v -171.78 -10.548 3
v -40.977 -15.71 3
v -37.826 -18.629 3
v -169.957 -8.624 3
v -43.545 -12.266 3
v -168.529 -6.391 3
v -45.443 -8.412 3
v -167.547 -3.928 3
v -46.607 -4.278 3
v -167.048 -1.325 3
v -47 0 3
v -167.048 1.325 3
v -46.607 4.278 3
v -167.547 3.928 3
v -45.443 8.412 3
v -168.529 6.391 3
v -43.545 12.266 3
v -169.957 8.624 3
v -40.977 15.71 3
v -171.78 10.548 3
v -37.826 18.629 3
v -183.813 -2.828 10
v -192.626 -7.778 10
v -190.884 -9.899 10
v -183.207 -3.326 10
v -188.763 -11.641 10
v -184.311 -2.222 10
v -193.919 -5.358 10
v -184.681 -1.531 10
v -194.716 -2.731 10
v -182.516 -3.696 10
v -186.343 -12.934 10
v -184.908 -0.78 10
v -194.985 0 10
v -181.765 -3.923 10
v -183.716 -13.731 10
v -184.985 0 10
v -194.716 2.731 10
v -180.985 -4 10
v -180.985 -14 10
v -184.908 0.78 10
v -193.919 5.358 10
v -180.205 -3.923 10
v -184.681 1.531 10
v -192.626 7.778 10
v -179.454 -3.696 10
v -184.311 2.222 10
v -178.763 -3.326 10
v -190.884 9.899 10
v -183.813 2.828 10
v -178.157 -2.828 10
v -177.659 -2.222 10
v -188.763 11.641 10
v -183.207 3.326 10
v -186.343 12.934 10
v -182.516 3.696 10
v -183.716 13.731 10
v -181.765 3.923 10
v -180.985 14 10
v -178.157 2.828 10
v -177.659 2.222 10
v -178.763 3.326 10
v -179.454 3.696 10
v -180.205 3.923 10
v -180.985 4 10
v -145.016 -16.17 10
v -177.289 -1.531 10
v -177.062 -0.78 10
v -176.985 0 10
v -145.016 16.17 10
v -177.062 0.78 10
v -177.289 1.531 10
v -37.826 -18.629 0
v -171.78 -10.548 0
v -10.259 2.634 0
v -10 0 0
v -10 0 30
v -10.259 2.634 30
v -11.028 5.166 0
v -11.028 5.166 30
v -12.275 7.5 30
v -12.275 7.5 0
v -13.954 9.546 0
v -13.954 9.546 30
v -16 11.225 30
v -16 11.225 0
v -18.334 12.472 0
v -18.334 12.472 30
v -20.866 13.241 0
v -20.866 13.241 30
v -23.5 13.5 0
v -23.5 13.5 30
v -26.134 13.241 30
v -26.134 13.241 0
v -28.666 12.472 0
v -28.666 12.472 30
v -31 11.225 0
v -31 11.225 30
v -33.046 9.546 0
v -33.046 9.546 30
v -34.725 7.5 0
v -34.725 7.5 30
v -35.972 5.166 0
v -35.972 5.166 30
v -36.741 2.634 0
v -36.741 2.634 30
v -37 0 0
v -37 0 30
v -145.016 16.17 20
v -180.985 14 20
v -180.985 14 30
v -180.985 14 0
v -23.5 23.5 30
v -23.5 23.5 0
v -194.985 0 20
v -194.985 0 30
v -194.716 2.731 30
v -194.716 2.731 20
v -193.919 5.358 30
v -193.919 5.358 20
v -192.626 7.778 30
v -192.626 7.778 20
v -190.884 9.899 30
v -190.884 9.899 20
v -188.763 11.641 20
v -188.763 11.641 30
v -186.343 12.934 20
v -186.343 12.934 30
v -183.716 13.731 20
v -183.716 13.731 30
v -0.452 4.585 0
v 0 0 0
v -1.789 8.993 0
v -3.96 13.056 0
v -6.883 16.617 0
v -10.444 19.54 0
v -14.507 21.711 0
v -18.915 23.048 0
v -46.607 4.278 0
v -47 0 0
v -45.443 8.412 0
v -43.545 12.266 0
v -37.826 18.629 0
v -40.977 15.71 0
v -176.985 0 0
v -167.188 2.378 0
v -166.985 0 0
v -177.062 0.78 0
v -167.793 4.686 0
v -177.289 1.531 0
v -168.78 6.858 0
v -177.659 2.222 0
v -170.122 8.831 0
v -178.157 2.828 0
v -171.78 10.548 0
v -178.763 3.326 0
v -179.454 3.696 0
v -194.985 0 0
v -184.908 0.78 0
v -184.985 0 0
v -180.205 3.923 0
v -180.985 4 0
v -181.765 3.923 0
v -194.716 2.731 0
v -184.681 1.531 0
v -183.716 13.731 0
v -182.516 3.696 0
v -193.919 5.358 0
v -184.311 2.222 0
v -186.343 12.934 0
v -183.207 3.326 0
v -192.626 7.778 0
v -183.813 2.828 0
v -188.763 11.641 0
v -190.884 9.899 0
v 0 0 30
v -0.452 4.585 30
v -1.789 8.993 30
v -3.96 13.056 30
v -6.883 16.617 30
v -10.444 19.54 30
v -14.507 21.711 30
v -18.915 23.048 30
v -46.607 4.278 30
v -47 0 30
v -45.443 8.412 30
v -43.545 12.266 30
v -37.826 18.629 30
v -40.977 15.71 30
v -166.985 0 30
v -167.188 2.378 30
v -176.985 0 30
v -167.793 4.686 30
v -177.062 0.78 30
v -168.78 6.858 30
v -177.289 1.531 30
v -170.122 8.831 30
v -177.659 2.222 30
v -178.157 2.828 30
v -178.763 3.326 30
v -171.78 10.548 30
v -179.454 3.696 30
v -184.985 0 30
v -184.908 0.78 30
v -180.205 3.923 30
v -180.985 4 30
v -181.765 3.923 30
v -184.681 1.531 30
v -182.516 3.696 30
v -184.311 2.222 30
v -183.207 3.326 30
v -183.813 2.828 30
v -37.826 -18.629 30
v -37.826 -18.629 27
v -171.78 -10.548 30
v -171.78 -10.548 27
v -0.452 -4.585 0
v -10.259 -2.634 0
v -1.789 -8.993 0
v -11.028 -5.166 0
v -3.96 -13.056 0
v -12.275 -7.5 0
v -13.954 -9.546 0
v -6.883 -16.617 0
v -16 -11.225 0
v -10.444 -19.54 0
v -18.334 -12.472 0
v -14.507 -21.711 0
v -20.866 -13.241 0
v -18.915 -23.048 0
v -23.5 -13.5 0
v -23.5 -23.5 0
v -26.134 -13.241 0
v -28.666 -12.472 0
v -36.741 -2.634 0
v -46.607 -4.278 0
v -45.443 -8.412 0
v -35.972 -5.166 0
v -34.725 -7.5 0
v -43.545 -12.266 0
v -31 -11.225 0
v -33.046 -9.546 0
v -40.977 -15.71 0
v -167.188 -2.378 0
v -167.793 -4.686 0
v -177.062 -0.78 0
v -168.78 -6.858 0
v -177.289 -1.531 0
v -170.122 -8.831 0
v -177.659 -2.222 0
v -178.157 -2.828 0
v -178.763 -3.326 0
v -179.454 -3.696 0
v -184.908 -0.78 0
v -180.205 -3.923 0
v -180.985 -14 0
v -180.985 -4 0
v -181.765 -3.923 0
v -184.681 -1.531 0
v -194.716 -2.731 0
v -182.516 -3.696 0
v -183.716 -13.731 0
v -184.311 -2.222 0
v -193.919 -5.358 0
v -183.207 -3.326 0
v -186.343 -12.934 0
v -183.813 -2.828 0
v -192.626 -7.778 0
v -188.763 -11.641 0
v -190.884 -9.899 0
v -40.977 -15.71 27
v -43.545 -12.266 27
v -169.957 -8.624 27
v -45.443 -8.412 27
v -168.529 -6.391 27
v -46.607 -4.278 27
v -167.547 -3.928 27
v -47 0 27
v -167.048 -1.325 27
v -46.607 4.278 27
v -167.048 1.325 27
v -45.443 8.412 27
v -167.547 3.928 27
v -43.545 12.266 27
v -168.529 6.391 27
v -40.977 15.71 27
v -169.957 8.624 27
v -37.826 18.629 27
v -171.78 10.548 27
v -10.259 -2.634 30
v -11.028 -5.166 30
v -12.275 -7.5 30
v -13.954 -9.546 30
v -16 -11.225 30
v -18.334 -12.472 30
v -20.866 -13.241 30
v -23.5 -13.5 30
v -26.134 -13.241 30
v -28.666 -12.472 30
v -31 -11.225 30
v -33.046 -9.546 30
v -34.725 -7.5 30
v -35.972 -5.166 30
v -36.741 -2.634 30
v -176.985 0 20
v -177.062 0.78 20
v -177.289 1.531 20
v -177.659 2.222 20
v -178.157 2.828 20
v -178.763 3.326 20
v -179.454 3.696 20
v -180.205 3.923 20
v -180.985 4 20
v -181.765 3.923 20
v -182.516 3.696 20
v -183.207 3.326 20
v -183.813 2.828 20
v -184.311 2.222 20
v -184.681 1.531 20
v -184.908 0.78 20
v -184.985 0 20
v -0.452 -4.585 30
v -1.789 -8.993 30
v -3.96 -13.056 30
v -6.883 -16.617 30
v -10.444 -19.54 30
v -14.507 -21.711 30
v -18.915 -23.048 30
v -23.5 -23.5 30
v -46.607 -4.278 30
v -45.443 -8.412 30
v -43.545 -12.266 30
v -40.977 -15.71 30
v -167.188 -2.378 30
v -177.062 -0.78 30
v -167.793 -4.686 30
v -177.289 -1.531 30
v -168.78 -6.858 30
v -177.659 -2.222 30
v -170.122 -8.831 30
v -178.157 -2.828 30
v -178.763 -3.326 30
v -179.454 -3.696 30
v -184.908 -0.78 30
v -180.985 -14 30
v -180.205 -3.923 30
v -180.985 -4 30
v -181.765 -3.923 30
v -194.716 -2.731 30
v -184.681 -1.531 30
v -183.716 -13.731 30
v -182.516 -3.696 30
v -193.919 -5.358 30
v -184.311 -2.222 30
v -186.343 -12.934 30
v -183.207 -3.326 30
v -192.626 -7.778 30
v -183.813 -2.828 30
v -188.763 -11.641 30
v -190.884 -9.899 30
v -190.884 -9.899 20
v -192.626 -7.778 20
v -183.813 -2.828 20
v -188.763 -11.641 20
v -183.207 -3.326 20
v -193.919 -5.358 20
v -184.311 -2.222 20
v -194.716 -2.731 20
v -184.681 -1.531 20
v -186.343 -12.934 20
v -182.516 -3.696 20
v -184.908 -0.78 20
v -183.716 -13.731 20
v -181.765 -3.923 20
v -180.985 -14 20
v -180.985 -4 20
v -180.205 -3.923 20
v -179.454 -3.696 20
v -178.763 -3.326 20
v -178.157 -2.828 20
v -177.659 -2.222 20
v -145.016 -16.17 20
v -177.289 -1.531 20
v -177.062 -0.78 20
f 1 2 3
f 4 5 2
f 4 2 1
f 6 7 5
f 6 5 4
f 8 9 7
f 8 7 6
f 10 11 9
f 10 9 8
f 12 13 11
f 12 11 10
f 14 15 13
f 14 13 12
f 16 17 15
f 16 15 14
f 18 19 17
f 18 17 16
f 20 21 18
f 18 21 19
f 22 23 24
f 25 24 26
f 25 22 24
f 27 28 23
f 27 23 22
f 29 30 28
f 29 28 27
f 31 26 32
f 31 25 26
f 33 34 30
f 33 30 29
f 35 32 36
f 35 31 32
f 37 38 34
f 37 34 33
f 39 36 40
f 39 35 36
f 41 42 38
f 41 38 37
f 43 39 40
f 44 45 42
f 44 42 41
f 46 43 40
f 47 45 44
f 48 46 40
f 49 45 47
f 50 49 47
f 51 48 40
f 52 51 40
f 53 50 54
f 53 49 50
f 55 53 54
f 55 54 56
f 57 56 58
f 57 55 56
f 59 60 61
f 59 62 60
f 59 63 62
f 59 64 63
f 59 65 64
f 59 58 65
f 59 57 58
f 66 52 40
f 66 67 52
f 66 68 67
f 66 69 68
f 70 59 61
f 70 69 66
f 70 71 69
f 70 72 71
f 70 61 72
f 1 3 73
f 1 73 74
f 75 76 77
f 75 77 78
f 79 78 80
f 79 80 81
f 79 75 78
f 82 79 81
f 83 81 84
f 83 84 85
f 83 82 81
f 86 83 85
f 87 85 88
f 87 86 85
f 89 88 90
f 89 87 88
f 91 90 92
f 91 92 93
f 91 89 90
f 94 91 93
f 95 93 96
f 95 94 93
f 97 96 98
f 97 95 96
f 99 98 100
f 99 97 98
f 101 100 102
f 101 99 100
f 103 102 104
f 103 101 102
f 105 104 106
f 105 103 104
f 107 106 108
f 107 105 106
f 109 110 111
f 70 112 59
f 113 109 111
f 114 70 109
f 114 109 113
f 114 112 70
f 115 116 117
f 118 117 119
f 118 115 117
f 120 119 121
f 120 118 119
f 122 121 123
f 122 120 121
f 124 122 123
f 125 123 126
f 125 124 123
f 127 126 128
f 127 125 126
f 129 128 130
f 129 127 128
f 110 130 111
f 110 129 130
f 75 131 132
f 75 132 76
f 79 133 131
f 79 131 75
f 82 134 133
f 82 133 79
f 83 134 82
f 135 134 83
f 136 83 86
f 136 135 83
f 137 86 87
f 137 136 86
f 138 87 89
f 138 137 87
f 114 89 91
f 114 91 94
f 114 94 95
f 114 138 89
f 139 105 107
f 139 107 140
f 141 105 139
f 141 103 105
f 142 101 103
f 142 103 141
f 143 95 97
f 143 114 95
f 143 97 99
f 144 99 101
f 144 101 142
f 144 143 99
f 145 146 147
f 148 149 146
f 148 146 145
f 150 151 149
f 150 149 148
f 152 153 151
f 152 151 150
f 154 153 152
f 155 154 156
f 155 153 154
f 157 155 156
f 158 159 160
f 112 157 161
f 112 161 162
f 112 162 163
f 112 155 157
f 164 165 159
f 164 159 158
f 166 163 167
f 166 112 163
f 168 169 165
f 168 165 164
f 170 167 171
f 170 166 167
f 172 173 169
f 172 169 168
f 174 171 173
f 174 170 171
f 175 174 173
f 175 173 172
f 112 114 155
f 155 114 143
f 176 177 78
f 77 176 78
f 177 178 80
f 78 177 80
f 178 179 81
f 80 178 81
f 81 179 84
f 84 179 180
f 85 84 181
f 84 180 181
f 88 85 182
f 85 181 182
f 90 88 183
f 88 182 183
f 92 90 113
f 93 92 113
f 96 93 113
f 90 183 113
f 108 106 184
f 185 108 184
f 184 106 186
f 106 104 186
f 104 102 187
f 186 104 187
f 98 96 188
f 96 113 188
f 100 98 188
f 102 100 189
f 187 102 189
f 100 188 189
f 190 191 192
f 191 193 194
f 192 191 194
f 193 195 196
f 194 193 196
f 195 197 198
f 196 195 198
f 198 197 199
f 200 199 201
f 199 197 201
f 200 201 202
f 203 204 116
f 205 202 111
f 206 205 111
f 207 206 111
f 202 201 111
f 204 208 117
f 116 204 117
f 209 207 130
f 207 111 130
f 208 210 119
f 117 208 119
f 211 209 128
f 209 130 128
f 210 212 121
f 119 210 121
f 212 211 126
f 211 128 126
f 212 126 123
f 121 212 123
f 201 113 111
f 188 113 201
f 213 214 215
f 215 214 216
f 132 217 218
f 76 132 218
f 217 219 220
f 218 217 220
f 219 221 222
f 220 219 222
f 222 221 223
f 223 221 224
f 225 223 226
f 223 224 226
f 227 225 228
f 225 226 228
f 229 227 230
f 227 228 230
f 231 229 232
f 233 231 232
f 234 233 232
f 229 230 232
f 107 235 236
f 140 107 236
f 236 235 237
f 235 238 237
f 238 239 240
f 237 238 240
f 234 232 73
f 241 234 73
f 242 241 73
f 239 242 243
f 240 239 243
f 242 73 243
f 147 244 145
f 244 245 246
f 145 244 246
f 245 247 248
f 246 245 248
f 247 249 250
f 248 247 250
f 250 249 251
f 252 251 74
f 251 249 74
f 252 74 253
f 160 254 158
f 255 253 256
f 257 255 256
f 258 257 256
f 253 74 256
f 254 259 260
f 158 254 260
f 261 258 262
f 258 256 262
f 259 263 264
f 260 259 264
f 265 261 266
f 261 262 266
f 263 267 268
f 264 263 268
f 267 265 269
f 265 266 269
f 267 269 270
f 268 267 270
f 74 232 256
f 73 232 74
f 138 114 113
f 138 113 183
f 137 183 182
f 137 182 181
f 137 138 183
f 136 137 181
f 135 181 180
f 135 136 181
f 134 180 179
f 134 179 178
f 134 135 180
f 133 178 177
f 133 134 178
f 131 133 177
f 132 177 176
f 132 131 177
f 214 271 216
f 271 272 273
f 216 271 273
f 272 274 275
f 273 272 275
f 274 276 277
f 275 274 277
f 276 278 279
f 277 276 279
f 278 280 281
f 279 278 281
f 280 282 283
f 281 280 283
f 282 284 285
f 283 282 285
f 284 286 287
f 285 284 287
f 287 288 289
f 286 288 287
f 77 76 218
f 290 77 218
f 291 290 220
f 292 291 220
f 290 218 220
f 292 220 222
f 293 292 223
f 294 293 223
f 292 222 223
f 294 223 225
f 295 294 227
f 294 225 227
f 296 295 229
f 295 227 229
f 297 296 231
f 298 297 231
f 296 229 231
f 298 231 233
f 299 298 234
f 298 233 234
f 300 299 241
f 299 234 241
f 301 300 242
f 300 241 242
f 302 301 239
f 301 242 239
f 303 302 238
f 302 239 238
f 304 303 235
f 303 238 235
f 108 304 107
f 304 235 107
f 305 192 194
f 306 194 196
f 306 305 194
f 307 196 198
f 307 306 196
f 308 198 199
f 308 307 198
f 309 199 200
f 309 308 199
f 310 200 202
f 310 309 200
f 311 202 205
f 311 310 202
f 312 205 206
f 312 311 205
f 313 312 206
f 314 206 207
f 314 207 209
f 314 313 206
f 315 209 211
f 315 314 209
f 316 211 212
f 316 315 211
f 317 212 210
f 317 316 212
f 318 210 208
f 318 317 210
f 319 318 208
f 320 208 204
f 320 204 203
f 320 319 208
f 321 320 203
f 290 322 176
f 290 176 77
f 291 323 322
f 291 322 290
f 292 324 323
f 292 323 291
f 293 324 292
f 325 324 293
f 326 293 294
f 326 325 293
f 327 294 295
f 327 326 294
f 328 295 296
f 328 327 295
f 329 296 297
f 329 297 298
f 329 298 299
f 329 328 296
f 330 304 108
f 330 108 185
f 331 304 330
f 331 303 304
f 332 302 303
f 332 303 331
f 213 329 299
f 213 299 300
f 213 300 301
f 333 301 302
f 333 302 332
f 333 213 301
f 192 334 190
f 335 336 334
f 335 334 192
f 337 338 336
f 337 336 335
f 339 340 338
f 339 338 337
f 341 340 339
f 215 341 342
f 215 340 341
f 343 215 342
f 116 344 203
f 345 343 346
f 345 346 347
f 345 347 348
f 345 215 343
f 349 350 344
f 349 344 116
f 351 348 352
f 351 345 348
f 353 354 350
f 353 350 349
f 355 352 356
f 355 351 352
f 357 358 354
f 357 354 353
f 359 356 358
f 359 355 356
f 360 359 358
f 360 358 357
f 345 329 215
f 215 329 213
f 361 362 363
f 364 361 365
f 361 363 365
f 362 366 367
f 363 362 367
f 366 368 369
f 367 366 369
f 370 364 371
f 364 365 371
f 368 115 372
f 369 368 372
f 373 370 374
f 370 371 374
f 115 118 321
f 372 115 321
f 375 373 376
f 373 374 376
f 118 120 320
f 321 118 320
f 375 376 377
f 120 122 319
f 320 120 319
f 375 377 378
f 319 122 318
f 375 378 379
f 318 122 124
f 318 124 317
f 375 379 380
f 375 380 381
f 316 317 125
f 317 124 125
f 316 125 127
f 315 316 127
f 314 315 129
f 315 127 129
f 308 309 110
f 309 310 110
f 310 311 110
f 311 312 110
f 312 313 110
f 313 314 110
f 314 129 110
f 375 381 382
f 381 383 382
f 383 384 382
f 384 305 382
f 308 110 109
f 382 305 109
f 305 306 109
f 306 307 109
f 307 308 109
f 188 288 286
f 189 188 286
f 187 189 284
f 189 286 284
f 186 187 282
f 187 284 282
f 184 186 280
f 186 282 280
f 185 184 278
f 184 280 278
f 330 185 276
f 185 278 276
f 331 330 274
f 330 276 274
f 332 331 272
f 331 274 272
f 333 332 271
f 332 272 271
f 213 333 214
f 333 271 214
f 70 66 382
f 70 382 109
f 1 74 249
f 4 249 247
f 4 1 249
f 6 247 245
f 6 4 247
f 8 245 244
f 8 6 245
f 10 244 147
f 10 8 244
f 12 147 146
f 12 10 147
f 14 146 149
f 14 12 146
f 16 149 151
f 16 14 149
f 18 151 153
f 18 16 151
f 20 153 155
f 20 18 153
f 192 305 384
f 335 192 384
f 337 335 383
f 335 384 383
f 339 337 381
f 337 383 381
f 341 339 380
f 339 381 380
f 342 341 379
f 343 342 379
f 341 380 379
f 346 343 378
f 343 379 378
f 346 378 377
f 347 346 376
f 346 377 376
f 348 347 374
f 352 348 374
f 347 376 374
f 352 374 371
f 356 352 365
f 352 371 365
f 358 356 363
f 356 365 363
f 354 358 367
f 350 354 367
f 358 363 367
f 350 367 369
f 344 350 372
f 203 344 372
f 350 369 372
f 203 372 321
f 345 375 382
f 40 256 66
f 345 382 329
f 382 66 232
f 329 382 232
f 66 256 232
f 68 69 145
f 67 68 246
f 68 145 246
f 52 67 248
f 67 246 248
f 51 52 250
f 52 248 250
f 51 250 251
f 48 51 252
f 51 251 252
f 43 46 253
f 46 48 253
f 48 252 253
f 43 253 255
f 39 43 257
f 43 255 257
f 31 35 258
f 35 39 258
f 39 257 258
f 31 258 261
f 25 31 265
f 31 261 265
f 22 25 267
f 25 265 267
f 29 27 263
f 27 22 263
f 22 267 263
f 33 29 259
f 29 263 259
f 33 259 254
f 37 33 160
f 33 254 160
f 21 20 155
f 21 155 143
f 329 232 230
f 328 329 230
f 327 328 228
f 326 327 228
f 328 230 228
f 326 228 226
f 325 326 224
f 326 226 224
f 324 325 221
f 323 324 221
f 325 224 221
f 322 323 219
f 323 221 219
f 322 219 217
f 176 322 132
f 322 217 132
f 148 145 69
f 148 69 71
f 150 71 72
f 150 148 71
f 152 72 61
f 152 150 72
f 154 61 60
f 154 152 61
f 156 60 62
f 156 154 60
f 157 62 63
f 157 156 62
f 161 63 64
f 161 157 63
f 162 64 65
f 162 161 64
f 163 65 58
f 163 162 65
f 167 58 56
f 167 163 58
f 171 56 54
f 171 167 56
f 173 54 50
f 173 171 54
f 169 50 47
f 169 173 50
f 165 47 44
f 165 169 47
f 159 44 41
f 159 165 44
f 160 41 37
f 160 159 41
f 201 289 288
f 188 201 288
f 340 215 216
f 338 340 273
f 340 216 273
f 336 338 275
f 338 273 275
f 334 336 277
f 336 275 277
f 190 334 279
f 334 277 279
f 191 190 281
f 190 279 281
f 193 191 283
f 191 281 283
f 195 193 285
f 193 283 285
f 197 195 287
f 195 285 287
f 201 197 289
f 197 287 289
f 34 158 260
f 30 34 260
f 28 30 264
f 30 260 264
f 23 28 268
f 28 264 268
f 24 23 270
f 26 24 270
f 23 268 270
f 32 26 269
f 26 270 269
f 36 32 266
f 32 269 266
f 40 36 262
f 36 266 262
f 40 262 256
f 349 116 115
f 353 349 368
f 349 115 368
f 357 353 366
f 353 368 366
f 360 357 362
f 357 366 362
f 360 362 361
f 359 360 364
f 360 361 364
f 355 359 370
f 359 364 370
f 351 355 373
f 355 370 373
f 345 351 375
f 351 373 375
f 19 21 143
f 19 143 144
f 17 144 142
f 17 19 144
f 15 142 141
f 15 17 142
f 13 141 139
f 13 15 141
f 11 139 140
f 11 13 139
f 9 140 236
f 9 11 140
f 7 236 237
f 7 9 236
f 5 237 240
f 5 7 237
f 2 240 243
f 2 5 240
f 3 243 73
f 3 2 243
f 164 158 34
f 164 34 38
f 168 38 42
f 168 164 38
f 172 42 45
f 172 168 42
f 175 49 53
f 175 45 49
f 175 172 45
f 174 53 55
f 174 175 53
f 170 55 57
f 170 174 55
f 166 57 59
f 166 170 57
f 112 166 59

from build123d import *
from build123d.topology import SkipClean

# Parameters (mm, degrees)
BOSS_EXTRUDE1_DEPTH     = 30
CUT_EXTRUDE1_DEPTH      = 5
CUT_EXTRUDE1_DEPTH_BACK = 5
SKETCH2_R               = 4
CUT_EXTRUDE2_START      = -3
CUT_EXTRUDE2_DEPTH      = 3


with BuildPart() as part:
    # Sketch1 → Boss-Extrude1 (new body)
    with BuildSketch(Plane(origin=(0, 0, 0), x_dir=(-1, 0, 0), z_dir=(0, 0, 1))):
        with BuildLine():
            Line((0, 0), (10, 0))
            ThreePointArc((10, 0), (23.5, 13.5), (37, 0))
            Line((37, 0), (153.995672066, 0))
            Line((153.995672066, 0), (176.985, 0))
            ThreePointArc((176.985, 0), (180.985, 4), (184.985, 0))
            Line((184.985, 0), (194.985, 0))
            ThreePointArc((194.985, 0), (190.884494937, 9.899494937), (180.985, 14))
            Line((180.985, 14), (23.5, 23.5))
            ThreePointArc((23.5, 23.5), (6.882990642, 16.617009358), (0, 0))
        make_face()
    boss_extrude1 = extrude(amount=BOSS_EXTRUDE1_DEPTH)

    # Mirror1: Boss-Extrude1 across Top Plane
    with SkipClean():  # the faces are left unmerged after this step: merging them gives an invalid solid
        add(boss_extrude1.mirror(Plane(origin=(0, 0, 0), x_dir=(1, 0, 0), z_dir=(0, 1, 0))))

    # Sketch2 → Cut-Extrude1 (cut, two sides: drawn at the far end of the back side and taken through both)
    with SkipClean():  # the faces are left unmerged after this step: merging them gives an invalid solid
        with BuildSketch(Plane.XY.offset(15).offset(-CUT_EXTRUDE1_DEPTH_BACK)):
            with BuildLine():
                Line((-145.016260464, 16.169749662), (-180.985, 14))
                ThreePointArc((-180.985, 14), (-194.985, 0), (-180.985, -14))
                Line((-180.985, -14), (-145.016260464, -16.169749662))
                Line((-145.016260464, -16.169749662), (-145.016260464, 16.169749662))
            make_face()
            with Locations(Location((-180.985, 0, 0), (0, 0, 180))):
                Circle(SKETCH2_R, mode=Mode.SUBTRACT)
        extrude(amount=CUT_EXTRUDE1_DEPTH + CUT_EXTRUDE1_DEPTH_BACK, mode=Mode.SUBTRACT)

    # Sketch3 → Cut-Extrude2 (cut)
    with SkipClean():  # the faces are left unmerged after this step: merging them gives an invalid solid
        with BuildSketch(Plane.XY.offset(30).offset(CUT_EXTRUDE2_START)):
            with BuildLine():
                Line((-171.779614491, 10.548027191), (-37.825745268, 18.628553956))
                ThreePointArc((-37.825745268, 18.628553956), (-47, 0), (-37.825745268, -18.628553956))
                Line((-37.825745268, -18.628553956), (-171.779614491, -10.548027191))
                ThreePointArc((-171.779614491, -10.548027191), (-166.985, 0), (-171.779614491, 10.548027191))
            make_face()
        cut_extrude2 = extrude(amount=CUT_EXTRUDE2_DEPTH, mode=Mode.SUBTRACT)

    # Mirror2: Cut-Extrude2 across plane
    with SkipClean():  # the faces are left unmerged after this step: merging them gives an invalid solid
        add(cut_extrude2.mirror(Plane.XY.offset(15)), mode=Mode.SUBTRACT)


solid = part.part
